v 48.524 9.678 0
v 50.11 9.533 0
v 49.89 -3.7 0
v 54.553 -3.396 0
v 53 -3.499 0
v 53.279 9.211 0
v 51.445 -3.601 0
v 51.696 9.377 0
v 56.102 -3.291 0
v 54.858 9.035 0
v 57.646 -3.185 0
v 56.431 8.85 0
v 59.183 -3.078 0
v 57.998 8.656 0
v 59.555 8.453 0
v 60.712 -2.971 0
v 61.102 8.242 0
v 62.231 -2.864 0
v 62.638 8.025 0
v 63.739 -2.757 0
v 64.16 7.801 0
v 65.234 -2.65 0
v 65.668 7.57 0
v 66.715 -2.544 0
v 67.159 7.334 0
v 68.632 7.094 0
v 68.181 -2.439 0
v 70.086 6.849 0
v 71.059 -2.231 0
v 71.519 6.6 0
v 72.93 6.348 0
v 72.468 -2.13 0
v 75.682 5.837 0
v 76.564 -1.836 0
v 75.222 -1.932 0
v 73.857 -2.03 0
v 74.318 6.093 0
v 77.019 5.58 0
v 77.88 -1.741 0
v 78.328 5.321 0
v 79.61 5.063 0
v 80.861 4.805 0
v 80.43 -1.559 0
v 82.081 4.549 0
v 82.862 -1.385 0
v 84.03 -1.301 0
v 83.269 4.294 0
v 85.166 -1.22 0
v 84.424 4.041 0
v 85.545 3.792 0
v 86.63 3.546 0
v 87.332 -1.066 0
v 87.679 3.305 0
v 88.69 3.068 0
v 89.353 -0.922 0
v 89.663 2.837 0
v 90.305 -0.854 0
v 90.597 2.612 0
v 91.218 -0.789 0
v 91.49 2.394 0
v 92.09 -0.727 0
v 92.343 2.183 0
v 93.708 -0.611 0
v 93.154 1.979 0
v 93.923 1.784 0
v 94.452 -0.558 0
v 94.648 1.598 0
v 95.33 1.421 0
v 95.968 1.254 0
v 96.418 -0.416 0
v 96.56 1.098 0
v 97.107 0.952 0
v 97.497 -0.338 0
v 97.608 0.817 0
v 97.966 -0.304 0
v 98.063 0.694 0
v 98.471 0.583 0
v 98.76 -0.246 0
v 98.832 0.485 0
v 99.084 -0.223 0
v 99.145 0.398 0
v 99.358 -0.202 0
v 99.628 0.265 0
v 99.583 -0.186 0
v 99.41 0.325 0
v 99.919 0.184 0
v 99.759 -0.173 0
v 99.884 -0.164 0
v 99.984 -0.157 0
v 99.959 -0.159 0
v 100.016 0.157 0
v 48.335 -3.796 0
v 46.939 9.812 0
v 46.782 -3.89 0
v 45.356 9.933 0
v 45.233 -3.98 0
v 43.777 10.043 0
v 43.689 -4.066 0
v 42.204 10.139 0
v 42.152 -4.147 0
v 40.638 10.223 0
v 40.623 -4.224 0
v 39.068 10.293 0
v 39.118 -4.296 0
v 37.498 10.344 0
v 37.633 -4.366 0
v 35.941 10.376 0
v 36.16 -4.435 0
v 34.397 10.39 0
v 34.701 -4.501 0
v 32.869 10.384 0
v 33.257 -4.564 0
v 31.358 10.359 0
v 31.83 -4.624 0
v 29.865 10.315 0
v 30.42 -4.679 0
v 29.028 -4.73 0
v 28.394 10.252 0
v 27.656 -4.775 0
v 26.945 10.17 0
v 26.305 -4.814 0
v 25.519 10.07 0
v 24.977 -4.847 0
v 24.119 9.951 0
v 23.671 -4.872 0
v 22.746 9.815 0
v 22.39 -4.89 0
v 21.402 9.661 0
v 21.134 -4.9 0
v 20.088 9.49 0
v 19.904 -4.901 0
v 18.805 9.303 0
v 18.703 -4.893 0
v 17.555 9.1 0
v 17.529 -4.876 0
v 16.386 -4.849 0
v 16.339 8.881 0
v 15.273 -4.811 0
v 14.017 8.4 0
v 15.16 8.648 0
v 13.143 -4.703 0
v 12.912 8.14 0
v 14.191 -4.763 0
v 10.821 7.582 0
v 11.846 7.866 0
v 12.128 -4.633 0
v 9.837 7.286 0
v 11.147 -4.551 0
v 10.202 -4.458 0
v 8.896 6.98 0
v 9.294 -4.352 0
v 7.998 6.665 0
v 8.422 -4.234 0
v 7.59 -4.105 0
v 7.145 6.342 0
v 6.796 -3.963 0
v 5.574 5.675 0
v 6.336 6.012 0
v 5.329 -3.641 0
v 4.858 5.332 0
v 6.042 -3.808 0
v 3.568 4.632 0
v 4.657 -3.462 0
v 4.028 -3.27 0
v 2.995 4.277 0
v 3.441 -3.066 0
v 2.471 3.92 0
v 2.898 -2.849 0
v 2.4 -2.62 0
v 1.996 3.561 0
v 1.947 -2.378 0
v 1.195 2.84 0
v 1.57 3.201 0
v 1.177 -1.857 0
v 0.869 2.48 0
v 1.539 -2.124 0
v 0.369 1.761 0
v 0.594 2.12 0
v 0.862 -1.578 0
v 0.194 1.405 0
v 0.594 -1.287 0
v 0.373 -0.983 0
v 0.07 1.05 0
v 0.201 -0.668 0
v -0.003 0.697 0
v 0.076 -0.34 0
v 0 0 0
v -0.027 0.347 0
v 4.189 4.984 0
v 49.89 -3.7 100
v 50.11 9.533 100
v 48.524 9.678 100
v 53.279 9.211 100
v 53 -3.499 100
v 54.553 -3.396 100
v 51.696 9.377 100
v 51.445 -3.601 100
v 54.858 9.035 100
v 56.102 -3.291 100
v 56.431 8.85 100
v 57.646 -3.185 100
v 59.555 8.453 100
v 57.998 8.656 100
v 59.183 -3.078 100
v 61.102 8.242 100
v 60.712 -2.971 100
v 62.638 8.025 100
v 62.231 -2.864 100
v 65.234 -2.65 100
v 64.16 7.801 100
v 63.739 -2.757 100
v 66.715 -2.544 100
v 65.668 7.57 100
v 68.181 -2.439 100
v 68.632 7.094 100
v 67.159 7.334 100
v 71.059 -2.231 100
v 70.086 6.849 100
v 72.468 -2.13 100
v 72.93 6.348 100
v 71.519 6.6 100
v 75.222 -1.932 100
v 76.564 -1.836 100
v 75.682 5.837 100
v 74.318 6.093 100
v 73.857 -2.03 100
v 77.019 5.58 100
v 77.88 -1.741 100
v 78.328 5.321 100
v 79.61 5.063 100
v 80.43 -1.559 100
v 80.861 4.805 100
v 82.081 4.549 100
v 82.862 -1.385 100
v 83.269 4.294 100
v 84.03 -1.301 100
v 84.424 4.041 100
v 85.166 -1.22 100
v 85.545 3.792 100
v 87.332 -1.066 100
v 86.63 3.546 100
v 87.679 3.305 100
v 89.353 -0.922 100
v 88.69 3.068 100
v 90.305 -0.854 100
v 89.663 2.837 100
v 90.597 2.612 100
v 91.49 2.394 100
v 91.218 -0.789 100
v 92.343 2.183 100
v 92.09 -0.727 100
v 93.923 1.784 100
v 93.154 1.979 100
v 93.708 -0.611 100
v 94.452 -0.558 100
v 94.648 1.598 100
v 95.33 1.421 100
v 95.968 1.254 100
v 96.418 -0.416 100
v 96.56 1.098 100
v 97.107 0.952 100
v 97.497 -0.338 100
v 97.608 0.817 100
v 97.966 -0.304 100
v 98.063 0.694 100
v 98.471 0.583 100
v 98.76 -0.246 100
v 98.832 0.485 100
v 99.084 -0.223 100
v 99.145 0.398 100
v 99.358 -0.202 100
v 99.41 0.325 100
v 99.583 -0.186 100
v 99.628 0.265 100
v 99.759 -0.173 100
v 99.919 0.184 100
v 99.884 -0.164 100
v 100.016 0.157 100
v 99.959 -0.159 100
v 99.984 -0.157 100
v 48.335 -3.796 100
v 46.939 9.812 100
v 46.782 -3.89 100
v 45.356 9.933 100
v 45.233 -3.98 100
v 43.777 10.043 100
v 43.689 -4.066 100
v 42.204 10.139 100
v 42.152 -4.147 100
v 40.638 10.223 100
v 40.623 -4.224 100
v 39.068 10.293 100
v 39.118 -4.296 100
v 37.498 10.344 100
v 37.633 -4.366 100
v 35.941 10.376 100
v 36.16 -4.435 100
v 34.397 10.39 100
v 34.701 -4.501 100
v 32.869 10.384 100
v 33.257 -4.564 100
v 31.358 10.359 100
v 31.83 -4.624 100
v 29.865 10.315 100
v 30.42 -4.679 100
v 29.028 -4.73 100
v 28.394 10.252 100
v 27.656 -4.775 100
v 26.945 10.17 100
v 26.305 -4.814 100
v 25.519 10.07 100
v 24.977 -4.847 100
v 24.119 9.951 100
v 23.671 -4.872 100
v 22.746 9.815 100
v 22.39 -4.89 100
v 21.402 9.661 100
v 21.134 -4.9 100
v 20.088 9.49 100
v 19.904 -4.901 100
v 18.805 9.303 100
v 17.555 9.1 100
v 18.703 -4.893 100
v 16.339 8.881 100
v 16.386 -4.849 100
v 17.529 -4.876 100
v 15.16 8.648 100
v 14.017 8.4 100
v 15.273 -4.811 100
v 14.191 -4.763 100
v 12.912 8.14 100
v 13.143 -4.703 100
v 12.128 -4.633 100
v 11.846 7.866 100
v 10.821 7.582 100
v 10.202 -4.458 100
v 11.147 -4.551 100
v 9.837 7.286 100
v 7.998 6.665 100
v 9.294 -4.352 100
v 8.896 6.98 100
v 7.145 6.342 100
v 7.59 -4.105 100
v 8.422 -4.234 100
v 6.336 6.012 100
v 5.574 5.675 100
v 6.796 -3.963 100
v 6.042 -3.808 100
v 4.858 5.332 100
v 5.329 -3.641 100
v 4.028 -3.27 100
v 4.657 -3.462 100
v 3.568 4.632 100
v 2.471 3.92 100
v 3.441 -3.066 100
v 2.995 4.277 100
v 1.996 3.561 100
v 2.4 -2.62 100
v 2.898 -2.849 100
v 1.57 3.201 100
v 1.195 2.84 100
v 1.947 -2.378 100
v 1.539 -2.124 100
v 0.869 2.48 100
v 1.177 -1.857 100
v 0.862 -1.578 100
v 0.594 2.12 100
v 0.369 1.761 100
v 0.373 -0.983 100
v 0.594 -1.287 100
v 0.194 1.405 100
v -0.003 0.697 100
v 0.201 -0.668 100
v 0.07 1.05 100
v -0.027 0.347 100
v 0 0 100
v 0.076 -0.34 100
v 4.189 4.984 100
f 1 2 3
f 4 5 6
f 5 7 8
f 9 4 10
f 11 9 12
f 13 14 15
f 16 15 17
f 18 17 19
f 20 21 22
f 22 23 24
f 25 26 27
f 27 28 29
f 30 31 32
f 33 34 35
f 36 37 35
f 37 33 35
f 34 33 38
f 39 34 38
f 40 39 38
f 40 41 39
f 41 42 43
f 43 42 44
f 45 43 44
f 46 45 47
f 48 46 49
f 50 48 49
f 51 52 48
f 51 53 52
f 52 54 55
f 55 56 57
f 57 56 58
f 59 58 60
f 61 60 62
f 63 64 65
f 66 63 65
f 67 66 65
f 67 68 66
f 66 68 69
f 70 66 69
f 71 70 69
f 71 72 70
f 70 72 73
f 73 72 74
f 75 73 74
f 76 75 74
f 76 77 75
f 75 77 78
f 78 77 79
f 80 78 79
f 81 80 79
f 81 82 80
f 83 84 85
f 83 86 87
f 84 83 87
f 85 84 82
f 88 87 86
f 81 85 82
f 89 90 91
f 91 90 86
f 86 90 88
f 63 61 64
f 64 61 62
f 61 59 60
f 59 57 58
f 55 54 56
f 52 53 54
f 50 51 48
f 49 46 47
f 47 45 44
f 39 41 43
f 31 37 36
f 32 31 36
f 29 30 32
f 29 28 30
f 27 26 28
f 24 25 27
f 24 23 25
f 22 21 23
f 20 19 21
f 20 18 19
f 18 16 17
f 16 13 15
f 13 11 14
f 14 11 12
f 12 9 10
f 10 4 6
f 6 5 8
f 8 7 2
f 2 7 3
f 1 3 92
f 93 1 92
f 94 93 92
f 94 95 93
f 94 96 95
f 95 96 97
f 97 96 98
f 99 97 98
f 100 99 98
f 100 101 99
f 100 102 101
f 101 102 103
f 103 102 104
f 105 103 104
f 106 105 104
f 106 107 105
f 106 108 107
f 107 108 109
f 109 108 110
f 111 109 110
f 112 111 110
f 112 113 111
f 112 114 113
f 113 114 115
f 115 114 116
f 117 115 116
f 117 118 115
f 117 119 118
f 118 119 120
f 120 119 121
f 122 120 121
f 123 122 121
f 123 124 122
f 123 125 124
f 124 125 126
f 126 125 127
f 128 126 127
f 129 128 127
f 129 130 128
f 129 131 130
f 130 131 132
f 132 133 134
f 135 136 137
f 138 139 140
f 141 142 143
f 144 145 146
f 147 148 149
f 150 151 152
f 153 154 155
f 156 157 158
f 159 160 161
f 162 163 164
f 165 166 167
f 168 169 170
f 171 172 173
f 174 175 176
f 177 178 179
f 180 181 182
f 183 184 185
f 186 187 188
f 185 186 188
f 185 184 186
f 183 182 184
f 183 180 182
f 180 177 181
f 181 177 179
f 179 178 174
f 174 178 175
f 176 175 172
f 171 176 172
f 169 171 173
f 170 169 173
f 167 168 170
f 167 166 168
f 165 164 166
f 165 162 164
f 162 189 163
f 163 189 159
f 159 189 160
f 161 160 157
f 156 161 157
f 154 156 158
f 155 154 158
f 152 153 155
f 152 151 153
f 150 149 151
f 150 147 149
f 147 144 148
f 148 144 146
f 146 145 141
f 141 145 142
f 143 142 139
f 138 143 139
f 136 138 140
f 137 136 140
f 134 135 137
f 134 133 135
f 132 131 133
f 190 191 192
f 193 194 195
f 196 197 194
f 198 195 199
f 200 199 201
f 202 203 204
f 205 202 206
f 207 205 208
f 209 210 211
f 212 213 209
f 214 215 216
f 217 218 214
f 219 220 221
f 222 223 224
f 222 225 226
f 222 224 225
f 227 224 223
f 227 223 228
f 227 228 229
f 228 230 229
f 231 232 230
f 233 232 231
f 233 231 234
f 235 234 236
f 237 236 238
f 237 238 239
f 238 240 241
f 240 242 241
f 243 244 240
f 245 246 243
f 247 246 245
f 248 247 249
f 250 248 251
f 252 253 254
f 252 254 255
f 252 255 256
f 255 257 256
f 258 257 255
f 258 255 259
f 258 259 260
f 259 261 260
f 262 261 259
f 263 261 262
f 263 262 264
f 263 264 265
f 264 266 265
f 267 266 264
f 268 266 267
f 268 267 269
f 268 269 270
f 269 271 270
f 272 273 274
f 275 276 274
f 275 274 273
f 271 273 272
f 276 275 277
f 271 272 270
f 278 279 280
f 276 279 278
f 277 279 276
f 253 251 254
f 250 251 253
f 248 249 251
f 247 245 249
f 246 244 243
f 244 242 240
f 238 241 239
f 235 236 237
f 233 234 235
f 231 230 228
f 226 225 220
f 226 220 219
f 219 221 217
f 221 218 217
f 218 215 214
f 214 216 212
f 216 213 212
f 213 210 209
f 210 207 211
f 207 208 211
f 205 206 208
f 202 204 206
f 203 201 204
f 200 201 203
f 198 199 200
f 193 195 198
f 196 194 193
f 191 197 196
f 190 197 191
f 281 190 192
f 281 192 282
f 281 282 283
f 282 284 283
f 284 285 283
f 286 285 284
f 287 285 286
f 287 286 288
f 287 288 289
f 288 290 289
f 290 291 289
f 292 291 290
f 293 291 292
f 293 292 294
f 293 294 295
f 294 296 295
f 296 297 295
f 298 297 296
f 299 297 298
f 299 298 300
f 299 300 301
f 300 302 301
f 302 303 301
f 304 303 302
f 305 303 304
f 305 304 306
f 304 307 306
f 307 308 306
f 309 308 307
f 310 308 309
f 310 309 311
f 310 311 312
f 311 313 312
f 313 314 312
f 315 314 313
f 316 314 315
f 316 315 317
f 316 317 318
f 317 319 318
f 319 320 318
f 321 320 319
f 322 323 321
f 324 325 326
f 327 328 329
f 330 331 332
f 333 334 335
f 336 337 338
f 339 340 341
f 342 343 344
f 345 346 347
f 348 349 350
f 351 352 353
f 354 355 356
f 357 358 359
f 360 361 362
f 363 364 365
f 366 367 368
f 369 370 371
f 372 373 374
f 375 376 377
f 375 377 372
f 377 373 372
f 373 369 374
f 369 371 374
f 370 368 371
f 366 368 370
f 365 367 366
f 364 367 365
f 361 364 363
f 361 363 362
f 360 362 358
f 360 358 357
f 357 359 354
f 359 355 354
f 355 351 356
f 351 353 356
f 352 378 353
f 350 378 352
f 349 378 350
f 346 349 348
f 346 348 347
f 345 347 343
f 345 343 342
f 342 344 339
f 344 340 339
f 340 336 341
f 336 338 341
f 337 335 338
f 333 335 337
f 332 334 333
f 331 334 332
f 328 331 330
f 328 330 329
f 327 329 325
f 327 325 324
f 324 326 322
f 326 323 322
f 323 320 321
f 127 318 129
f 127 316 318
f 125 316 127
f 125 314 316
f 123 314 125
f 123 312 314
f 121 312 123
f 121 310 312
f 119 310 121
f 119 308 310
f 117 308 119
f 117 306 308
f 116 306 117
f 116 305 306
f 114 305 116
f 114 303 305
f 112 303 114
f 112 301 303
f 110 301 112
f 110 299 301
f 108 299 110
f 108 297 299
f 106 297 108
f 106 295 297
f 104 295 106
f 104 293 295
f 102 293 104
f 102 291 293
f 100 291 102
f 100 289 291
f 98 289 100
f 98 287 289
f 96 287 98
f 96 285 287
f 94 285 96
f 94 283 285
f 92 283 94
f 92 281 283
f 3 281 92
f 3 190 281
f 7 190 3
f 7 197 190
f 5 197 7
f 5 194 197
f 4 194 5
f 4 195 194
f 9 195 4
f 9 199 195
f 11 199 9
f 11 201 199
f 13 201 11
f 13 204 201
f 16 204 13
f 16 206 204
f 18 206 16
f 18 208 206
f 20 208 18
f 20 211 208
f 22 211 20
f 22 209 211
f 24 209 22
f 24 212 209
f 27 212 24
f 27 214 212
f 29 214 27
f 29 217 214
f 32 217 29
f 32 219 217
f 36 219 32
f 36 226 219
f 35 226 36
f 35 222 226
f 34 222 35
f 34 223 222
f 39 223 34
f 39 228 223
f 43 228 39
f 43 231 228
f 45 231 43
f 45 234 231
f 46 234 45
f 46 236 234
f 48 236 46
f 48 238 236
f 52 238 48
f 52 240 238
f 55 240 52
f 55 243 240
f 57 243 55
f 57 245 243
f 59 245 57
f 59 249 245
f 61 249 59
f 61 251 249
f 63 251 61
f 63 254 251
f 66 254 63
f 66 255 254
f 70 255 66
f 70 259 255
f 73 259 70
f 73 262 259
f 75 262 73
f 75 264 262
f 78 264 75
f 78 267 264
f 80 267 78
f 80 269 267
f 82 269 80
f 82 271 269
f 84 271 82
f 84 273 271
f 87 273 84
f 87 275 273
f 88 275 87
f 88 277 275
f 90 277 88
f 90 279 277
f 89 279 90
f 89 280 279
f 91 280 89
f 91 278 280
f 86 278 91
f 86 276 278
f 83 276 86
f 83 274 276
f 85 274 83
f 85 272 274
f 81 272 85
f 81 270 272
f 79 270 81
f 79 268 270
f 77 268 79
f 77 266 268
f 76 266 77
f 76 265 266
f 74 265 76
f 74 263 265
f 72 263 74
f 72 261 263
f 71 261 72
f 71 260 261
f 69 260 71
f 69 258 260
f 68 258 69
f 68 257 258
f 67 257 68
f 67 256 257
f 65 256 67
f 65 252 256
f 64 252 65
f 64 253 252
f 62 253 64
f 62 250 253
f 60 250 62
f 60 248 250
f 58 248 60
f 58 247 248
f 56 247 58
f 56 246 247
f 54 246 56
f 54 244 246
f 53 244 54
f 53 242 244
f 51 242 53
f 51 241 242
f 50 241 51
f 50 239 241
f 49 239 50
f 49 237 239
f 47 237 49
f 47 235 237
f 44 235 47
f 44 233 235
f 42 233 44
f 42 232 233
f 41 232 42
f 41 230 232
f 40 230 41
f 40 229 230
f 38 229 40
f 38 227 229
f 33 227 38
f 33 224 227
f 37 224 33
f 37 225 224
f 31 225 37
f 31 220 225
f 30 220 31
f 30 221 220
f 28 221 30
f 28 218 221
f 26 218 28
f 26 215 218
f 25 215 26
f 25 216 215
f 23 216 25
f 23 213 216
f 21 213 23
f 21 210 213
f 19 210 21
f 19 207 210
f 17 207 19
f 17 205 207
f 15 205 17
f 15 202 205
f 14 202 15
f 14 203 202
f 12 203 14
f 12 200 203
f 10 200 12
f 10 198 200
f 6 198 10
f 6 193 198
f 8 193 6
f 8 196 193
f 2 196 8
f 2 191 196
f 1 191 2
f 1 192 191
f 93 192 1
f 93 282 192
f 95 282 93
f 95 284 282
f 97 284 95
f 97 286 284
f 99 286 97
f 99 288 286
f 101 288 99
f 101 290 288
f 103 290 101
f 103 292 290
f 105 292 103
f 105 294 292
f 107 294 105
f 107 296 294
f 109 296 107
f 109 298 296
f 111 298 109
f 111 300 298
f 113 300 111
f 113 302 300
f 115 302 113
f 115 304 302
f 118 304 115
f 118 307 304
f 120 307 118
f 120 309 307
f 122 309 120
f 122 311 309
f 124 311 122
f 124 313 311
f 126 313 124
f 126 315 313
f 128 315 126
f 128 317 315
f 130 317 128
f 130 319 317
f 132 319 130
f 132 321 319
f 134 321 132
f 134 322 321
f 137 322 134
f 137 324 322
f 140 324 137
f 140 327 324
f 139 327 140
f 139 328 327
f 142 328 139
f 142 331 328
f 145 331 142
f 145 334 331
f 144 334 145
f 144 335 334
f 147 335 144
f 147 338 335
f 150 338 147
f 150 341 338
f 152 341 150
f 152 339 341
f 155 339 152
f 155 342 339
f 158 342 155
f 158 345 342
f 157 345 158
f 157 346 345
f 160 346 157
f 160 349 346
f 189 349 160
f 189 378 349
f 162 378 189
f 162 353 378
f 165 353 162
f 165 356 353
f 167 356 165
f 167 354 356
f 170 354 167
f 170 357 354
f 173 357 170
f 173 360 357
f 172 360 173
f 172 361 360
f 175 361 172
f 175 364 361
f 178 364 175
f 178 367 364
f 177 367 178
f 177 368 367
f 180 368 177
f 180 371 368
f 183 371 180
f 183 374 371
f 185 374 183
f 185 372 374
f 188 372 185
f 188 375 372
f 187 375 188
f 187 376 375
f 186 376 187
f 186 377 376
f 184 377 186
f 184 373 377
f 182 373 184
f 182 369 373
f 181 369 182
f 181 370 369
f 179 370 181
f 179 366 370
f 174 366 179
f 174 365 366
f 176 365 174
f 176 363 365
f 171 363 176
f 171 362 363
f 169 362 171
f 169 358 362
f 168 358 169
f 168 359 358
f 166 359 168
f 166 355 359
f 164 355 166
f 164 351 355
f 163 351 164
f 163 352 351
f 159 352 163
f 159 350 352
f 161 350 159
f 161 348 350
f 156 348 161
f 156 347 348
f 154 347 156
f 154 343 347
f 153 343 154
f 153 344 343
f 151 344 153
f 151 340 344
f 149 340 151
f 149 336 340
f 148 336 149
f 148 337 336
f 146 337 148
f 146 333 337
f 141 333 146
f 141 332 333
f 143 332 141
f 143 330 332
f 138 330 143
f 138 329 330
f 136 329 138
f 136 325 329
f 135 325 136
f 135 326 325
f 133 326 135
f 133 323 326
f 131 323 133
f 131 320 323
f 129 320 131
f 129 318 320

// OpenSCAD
// file: scad/NACA3415.scad
points = [[1.000157,0.001567],
[0.999914,0.001635],
[0.999187,0.001838],
[0.997976,0.002175],
[0.996281,0.002647],
[0.994105,0.00325],
[0.99145,0.003984],
[0.988316,0.004846],
[0.984709,0.005834],
[0.980629,0.006944],
[0.976082,0.008174],
[0.971071,0.00952],
[0.965601,0.010977],
[0.959676,0.012543],
[0.953301,0.014212],
[0.946483,0.01598],
[0.939227,0.017842],
[0.931541,0.019792],
[0.92343,0.021826],
[0.914902,0.023937],
[0.905966,0.026121],
[0.896628,0.028371],
[0.886899,0.030682],
[0.876786,0.033048],
[0.866299,0.035463],
[0.855448,0.03792],
[0.844243,0.040414],
[0.832694,0.042938],
[0.820812,0.045486],
[0.808609,0.048052],
[0.796096,0.05063],
[0.783284,0.053213],
[0.770187,0.055796],
[0.756816,0.058372],
[0.743184,0.060935],
[0.729305,0.06348],
[0.715192,0.065999],
[0.700859,0.068486],
[0.686319,0.070937],
[0.671586,0.073345],
[0.656676,0.075703],
[0.641603,0.078006],
[0.626381,0.080249],
[0.611025,0.082425],
[0.595552,0.084529],
[0.579976,0.086556],
[0.564312,0.088499],
[0.548578,0.090353],
[0.532787,0.092114],
[0.516957,0.093775],
[0.501103,0.095333],
[0.485241,0.096781],
[0.469388,0.098116],
[0.45356,0.099333],
[0.437772,0.100427],
[0.422042,0.101395],
[0.406385,0.102233],
[0.39068,0.102928],
[0.374984,0.10344],
[0.359408,0.103763],
[0.34397,0.103896],
[0.328687,0.103837],
[0.313576,0.103588],
[0.298655,0.103148],
[0.283939,0.102518],
[0.269446,0.101702],
[0.255192,0.100699],
[0.241192,0.099515],
[0.227462,0.098151],
[0.214019,0.096613],
[0.200876,0.094904],
[0.188048,0.09303],
[0.17555,0.090996],
[0.163394,0.088809],
[0.151596,0.086476],
[0.140166,0.084002],
[0.129117,0.081396],
[0.118462,0.078665],
[0.10821,0.075817],
[0.098373,0.07286],
[0.088961,0.069803],
[0.079983,0.066655],
[0.071447,0.063424],
[0.063362,0.060118],
[0.055736,0.056747],
[0.048576,0.053319],
[0.041887,0.049842],
[0.035676,0.046325],
[0.029948,0.042775],
[0.024707,0.039201],
[0.019958,0.035609],
[0.015704,0.032007],
[0.011949,0.0284],
[0.008693,0.024796],
[0.00594,0.021199],
[0.00369,0.017614],
[0.001944,0.014046],
[0.000703,0.010498],
[-0.000035,0.006973],
[-0.000268,0.003473],
[0,0],
[0.000762,-0.003399],
[0.002008,-0.006677],
[0.003735,-0.009834],
[0.005941,-0.012869],
[0.008622,-0.015782],
[0.011773,-0.018572],
[0.01539,-0.021238],
[0.019468,-0.02378],
[0.024002,-0.026198],
[0.028985,-0.028492],
[0.034412,-0.03066],
[0.040276,-0.032704],
[0.04657,-0.034622],
[0.053286,-0.036415],
[0.060418,-0.038084],
[0.067957,-0.039627],
[0.075896,-0.041048],
[0.084225,-0.042345],
[0.092937,-0.04352],
[0.102022,-0.044576],
[0.111472,-0.045512],
[0.121277,-0.046331],
[0.131427,-0.047035],
[0.141914,-0.047628],
[0.152727,-0.04811],
[0.163857,-0.048487],
[0.175294,-0.04876],
[0.187026,-0.048934],
[0.199045,-0.049013],
[0.211339,-0.049002],
[0.223898,-0.048904],
[0.236711,-0.048724],
[0.249767,-0.048468],
[0.263055,-0.048142],
[0.276563,-0.047749],
[0.290281,-0.047297],
[0.304197,-0.046792],
[0.318299,-0.046238],
[0.332575,-0.045642],
[0.347013,-0.04501],
[0.361601,-0.044348],
[0.376327,-0.043663],
[0.391177,-0.042959],
[0.406233,-0.04224],
[0.421523,-0.041474],
[0.436894,-0.040659],
[0.452332,-0.0398],
[0.467821,-0.0389],
[0.483348,-0.037965],
[0.498897,-0.036999],
[0.514454,-0.036007],
[0.530004,-0.034991],
[0.545531,-0.033958],
[0.561021,-0.032909],
[0.576459,-0.031849],
[0.591829,-0.030782],
[0.607118,-0.029711],
[0.622309,-0.028638],
[0.637389,-0.027566],
[0.652341,-0.026499],
[0.667152,-0.025438],
[0.681806,-0.024386],
[0.696289,-0.023344],
[0.710587,-0.022315],
[0.724685,-0.021301],
[0.738569,-0.020302],
[0.752225,-0.01932],
[0.76564,-0.018356],
[0.778799,-0.017412],
[0.79169,-0.016489],
[0.804298,-0.015586],
[0.816612,-0.014706],
[0.828618,-0.013848],
[0.840304,-0.013015],
[0.851659,-0.012205],
[0.86267,-0.01142],
[0.873325,-0.010661],
[0.883614,-0.009928],
[0.893527,-0.009222],
[0.903051,-0.008542],
[0.912178,-0.007891],
[0.920898,-0.007268],
[0.929201,-0.006674],
[0.937079,-0.00611],
[0.944523,-0.005576],
[0.951526,-0.005072],
[0.958079,-0.0046],
[0.964176,-0.004161],
[0.969809,-0.003753],
[0.974974,-0.003379],
[0.979664,-0.003039],
[0.983874,-0.002733],
[0.9876,-0.002462],
[0.990838,-0.002226],
[0.993583,-0.002025],
[0.995833,-0.001861],
[0.997586,-0.001732],
[0.99884,-0.001641],
[0.999592,-0.001586],
[0.999843,-0.001567],
];
// main file
include <scad/NACA3415.scad>

linear_extrude(height=100){
    polygon(points*100);
}
